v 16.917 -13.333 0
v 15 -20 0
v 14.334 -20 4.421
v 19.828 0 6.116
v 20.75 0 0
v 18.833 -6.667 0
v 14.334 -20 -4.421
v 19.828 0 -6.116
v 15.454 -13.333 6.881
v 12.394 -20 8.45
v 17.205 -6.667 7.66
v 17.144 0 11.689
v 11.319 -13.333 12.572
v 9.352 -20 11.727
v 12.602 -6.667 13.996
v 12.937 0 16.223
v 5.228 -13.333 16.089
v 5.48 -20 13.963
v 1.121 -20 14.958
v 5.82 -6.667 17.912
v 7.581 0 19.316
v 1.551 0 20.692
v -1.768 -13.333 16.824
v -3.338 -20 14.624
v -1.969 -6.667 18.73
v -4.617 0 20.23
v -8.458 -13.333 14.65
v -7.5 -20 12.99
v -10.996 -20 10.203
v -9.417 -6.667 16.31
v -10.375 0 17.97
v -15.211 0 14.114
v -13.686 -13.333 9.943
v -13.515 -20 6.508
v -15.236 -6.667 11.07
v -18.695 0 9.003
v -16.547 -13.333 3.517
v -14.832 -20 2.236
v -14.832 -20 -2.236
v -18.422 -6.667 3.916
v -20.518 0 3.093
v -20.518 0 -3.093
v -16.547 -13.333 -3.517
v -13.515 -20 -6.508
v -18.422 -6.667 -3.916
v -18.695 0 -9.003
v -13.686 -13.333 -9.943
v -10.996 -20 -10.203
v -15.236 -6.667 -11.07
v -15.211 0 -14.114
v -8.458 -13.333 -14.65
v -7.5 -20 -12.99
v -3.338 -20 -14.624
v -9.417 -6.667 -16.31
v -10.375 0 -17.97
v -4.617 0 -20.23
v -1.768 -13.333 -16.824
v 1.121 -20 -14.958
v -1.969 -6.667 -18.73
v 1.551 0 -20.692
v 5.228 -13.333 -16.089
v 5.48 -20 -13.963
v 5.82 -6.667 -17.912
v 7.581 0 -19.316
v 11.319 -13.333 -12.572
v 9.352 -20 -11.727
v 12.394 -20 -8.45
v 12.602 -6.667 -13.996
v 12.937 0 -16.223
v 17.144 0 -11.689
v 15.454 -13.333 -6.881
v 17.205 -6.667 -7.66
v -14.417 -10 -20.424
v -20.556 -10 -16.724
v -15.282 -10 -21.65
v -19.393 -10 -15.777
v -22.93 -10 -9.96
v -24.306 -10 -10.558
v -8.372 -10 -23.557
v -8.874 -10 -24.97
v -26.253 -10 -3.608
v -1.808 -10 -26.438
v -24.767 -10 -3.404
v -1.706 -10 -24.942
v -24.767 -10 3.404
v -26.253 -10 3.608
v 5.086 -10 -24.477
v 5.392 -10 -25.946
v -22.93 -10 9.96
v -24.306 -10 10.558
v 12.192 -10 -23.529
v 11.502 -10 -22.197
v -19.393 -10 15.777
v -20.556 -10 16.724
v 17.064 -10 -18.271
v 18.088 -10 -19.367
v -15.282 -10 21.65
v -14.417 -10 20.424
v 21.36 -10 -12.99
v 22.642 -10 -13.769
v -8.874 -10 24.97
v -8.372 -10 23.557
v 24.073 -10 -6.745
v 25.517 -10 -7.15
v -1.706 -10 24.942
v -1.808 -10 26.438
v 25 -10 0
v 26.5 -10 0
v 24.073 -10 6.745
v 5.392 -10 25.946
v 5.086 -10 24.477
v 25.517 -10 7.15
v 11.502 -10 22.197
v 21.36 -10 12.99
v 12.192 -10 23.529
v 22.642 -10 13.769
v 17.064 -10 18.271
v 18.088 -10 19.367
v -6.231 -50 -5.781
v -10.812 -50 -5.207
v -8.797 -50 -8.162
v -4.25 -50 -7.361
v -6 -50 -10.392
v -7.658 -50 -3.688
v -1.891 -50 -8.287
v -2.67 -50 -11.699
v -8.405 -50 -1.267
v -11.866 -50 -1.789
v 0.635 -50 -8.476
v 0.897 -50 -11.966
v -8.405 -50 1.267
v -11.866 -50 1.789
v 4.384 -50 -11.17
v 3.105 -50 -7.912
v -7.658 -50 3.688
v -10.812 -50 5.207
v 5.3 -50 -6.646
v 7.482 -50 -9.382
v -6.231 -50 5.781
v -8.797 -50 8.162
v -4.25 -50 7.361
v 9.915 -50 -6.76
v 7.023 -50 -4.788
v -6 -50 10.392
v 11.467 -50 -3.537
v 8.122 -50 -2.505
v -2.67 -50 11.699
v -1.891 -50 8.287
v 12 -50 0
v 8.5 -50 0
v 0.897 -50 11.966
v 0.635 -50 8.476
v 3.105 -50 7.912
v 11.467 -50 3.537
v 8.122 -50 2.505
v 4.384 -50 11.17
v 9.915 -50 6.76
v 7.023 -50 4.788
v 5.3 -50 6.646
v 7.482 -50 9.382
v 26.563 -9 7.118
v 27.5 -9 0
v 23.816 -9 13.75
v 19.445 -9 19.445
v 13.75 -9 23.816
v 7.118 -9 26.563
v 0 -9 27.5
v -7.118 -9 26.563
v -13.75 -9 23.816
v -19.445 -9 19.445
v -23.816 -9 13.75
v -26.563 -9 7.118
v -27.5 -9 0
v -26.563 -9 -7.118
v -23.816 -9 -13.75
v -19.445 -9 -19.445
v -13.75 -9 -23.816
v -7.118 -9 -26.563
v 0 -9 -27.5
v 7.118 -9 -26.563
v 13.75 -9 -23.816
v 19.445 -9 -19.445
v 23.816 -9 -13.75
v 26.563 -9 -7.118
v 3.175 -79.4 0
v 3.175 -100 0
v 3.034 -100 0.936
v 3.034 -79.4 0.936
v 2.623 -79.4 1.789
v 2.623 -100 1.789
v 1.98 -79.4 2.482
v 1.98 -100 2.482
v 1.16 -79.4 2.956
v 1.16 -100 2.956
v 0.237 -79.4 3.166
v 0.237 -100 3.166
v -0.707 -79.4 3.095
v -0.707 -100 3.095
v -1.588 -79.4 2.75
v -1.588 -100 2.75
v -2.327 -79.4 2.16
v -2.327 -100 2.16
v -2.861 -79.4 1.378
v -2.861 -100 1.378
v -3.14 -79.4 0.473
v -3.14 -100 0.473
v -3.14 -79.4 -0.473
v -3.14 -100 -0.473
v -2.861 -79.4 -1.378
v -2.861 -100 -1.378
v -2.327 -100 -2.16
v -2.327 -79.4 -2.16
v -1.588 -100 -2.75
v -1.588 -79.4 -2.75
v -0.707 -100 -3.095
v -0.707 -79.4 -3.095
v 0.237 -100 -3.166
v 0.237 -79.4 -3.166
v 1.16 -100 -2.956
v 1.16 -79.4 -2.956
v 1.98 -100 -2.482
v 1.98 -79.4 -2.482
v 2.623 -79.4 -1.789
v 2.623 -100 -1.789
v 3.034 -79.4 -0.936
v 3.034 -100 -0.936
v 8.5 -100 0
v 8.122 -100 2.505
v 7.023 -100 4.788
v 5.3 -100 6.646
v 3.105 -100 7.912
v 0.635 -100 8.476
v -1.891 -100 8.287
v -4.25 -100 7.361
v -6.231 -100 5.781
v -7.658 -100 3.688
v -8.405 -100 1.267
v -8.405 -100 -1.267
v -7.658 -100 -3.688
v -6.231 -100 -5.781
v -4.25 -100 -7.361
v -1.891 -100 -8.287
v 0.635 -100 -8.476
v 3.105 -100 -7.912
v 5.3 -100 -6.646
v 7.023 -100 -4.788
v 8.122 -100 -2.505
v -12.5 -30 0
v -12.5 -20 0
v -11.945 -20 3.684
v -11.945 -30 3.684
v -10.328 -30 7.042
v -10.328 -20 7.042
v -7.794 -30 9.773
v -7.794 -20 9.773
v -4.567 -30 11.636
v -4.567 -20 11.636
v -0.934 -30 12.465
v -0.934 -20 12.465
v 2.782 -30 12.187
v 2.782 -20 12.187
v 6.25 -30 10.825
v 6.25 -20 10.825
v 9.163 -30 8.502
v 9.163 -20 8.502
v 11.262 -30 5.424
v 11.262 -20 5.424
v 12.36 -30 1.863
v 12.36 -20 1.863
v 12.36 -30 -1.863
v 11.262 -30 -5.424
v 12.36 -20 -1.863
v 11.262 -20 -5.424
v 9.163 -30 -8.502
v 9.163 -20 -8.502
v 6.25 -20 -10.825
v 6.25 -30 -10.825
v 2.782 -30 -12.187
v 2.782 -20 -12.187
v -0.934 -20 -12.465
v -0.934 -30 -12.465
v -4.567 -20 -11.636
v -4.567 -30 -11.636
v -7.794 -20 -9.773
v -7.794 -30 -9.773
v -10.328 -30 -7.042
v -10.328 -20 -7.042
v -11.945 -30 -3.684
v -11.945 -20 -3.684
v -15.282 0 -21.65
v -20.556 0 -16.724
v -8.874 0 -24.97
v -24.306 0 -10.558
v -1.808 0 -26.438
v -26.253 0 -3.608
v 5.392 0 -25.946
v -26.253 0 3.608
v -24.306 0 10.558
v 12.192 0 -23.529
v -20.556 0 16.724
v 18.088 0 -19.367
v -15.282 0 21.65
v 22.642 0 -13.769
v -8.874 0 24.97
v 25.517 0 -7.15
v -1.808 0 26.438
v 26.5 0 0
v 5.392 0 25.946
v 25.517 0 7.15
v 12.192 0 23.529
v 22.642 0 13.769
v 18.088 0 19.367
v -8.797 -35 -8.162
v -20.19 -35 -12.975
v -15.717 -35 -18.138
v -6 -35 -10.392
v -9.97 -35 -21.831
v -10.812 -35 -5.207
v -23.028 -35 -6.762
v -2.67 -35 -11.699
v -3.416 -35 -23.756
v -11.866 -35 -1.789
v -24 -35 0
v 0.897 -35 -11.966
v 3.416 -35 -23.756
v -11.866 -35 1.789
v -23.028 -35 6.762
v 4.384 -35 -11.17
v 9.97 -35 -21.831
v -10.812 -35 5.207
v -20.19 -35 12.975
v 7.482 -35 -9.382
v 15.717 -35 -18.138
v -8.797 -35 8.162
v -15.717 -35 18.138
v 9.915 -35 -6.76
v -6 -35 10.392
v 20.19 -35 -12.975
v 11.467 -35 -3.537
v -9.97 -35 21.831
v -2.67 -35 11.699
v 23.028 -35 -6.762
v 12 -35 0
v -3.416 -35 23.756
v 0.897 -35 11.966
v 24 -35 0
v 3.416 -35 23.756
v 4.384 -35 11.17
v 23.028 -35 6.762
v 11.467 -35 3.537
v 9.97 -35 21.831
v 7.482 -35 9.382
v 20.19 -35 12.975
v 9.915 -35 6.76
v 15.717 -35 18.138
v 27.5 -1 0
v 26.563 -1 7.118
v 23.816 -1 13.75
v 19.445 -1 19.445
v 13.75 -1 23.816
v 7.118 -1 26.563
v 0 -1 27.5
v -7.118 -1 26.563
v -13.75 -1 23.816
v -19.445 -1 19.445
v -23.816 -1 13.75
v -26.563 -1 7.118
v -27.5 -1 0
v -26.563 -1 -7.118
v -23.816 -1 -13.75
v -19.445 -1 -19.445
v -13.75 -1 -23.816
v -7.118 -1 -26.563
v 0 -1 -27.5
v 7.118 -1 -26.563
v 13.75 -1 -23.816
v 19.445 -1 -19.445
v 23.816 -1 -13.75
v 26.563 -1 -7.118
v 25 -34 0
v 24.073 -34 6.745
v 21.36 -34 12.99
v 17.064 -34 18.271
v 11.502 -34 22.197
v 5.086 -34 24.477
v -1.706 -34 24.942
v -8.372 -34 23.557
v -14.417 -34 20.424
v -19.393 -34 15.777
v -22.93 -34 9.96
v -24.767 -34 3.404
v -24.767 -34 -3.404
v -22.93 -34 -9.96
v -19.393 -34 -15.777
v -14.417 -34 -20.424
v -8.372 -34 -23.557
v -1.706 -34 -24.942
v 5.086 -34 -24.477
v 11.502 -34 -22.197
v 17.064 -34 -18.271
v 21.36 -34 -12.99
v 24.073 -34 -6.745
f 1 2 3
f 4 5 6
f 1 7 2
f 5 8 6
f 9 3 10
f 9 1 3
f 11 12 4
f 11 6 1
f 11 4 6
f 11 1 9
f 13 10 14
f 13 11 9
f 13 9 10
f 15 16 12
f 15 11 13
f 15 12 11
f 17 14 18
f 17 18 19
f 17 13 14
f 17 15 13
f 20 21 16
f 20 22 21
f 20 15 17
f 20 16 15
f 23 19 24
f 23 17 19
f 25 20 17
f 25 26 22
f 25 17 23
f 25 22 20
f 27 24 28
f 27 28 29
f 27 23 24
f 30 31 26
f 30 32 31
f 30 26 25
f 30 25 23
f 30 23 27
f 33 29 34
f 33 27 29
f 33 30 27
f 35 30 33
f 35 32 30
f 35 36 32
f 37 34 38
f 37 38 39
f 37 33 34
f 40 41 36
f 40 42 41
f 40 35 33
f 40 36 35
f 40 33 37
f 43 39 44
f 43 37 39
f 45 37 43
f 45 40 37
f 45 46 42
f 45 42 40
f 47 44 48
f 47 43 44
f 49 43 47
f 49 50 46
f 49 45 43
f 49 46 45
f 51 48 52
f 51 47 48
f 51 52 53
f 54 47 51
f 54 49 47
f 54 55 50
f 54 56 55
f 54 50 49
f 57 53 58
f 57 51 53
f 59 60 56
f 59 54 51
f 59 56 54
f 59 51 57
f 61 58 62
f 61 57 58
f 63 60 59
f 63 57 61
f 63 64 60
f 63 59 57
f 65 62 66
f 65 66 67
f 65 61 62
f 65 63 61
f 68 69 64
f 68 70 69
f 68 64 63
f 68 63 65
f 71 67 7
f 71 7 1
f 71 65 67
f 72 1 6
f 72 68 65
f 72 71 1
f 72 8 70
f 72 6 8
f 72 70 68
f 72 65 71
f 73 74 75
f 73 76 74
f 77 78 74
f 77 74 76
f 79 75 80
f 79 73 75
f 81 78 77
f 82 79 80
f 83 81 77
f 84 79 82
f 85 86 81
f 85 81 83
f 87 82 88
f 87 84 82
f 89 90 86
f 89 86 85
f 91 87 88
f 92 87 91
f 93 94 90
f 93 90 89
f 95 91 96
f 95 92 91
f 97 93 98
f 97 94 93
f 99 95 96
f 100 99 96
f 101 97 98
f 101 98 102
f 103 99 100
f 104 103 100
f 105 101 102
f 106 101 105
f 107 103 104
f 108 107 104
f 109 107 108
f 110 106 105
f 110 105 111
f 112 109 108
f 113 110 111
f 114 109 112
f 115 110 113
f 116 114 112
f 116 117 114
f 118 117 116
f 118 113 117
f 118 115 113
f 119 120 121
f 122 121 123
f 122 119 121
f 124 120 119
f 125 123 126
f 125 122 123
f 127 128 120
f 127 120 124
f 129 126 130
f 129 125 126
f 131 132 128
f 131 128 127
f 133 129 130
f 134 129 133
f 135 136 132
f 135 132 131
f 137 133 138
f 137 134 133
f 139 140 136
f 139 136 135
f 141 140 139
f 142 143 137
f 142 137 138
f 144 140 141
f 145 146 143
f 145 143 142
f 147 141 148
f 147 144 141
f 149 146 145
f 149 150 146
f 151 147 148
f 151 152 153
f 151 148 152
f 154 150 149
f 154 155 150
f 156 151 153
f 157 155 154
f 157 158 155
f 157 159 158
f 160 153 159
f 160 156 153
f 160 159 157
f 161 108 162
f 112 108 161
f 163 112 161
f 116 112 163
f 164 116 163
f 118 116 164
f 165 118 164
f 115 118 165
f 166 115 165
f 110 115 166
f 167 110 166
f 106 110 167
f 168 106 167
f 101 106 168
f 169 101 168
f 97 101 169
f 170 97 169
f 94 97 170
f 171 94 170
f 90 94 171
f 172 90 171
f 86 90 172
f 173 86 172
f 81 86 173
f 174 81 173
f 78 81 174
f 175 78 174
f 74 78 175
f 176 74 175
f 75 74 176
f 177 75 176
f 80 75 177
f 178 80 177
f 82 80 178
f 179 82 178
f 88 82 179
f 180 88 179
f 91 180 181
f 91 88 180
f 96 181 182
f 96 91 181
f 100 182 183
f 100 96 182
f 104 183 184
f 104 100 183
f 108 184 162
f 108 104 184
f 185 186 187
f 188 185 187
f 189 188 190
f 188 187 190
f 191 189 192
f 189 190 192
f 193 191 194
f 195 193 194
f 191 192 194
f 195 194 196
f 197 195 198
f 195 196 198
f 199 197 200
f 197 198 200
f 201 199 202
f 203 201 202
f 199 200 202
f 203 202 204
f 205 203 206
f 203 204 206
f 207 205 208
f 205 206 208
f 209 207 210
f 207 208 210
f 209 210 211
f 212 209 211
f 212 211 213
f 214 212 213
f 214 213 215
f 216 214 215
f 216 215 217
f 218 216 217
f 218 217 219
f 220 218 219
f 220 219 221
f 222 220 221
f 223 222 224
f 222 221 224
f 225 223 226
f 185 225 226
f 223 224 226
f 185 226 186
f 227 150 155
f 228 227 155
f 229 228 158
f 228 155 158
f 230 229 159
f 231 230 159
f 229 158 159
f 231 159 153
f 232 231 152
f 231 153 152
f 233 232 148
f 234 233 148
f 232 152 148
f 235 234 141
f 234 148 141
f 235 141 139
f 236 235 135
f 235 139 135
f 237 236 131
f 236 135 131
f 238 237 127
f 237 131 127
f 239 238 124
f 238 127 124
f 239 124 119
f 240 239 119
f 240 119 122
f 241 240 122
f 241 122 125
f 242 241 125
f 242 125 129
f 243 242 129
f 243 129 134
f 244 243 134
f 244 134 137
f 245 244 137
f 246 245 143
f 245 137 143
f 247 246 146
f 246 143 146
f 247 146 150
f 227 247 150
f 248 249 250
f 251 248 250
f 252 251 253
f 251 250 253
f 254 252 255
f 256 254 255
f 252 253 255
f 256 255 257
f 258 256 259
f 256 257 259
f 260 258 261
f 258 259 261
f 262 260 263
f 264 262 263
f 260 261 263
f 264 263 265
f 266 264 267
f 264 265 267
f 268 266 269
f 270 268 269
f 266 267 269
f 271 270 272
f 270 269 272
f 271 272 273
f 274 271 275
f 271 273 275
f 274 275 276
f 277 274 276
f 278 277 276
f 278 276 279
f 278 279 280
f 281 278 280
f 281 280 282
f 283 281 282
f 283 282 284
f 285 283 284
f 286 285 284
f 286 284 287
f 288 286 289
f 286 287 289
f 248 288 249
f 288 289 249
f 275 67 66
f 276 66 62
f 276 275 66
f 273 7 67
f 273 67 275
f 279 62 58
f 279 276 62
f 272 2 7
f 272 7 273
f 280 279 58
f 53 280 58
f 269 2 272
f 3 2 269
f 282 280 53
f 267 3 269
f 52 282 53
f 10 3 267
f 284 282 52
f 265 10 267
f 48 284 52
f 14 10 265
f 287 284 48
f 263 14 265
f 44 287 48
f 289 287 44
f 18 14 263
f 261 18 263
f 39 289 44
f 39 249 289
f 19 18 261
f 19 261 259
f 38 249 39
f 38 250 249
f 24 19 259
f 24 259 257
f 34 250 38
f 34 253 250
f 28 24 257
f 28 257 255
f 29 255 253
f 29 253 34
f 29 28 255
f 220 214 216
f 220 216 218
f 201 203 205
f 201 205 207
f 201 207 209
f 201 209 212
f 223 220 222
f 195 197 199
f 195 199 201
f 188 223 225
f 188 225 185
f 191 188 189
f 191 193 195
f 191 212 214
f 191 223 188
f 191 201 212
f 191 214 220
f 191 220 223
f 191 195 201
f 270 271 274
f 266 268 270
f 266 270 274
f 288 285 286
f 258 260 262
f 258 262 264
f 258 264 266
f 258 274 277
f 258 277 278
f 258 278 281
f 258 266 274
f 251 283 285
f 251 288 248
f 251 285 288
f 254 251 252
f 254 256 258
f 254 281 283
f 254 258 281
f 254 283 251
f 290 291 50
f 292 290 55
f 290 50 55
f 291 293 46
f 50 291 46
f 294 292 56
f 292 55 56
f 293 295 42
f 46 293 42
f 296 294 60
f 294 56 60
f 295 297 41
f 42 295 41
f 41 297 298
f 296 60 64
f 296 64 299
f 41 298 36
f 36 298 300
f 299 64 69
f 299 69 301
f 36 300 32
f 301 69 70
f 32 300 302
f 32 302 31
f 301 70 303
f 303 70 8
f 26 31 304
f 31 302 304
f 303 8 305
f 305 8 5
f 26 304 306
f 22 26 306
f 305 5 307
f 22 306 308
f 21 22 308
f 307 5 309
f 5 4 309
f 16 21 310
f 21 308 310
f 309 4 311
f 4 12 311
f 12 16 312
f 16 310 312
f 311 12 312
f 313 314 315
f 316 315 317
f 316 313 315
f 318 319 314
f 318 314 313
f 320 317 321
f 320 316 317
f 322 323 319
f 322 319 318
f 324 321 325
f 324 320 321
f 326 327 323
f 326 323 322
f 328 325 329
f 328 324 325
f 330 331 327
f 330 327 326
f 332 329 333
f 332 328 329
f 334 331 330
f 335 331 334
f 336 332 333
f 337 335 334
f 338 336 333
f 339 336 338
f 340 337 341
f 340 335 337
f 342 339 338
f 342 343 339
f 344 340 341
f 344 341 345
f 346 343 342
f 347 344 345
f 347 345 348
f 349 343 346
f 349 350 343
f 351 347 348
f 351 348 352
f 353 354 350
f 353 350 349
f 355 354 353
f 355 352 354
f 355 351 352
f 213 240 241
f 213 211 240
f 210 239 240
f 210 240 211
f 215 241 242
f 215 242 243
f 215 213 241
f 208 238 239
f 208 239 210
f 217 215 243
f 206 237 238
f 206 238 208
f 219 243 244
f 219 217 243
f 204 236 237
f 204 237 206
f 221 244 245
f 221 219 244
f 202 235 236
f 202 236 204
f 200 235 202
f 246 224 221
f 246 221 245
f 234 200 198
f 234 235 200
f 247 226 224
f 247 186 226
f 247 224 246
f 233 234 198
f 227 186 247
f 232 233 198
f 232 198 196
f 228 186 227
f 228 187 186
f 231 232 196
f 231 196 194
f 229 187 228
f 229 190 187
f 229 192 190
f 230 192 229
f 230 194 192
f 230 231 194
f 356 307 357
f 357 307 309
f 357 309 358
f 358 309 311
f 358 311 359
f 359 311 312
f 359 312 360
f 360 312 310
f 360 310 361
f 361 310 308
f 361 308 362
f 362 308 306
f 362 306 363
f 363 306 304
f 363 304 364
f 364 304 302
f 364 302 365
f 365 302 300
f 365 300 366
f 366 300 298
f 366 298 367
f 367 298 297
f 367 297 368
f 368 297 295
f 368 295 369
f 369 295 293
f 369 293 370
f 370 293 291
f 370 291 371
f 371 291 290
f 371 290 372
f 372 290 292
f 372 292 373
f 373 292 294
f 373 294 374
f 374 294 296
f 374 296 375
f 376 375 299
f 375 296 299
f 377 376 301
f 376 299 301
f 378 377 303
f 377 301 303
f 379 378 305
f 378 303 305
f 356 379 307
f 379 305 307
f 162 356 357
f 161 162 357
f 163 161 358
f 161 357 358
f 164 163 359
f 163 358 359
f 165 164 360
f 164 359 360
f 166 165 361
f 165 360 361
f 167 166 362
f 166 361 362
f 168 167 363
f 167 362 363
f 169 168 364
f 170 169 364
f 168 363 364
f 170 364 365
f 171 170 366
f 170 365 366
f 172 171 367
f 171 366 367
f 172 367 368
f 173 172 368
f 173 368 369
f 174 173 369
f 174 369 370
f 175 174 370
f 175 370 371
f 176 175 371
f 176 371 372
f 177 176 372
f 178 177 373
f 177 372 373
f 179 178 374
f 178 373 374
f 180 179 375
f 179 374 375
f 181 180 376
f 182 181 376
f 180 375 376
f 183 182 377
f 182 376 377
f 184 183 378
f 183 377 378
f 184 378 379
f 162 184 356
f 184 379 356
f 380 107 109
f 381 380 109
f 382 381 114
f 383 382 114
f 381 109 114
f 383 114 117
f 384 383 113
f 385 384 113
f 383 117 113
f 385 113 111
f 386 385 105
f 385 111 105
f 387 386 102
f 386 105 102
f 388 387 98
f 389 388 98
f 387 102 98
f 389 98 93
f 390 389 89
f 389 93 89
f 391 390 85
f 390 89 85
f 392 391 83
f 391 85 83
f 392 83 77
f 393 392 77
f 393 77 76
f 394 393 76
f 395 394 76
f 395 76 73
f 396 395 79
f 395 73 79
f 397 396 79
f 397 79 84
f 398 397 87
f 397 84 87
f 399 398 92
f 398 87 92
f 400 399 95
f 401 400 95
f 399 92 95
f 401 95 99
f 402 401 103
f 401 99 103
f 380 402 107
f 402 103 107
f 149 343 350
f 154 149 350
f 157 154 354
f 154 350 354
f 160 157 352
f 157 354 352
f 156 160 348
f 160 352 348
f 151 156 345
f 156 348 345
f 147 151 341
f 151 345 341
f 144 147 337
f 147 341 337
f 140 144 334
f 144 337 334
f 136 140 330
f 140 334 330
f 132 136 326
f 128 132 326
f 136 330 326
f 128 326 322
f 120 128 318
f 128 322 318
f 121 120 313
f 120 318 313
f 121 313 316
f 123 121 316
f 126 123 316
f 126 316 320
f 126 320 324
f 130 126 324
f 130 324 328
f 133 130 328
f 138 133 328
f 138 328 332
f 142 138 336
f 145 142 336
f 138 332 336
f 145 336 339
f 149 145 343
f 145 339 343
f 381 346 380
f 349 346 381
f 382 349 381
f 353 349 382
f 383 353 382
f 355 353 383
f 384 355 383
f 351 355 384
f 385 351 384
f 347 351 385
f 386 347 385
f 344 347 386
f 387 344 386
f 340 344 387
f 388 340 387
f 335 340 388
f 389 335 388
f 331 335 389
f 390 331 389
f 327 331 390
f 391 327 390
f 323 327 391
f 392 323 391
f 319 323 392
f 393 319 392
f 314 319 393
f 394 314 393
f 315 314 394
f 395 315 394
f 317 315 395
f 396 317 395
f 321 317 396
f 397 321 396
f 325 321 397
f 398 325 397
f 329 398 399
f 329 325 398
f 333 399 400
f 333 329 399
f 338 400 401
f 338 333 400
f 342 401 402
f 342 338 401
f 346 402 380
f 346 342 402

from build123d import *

# Parameters (mm, degrees)
F0_R      = 27.5
F1_DEPTH  = 10
F2_R      = 25
F3_DEPTH  = 25
F4_R      = 12
F5_DEPTH  = 15
F6_SIZE   = 1
F9_R      = 12.5
F10_DEPTH = 10
F11_R     = 8.5
F12_DEPTH = 50
F13_R     = 3.175
F14_DEPTH = 20.6


with BuildPart() as f1:
    # F0 (on Front) → F1 (new body)
    with BuildSketch(Plane.XZ):
        Circle(F0_R)
    extrude(amount=F1_DEPTH)

    # F2 (on face) → F3 (join)
    with BuildSketch(Plane.XZ.offset(10)):
        Circle(F2_R)
    extrude(amount=F3_DEPTH)

    # F4 (on face) → F5 (join)
    with BuildSketch(Plane.XZ.offset(35)):
        Circle(F4_R)
    extrude(amount=F5_DEPTH)

    # F6
    f6_edges = [f1.edges().sort_by_distance(p)[0] for p in [
        (-27.5, -10, 0),
        (-27.5, 0, 0),
        (-25, -35, 0),
    ]]
    chamfer(f6_edges, length=F6_SIZE)

    # F7 (on Top) → F8 (revolve, cut)
    with BuildSketch(Plane.XY):
        Polygon((20.75, 0), (0, 0), (0, -20), (15, -20), align=None)
    revolve(axis=Axis((0, -10, 0), (0, -1, 0)), mode=Mode.SUBTRACT)

    # F9 (on face) → F10 (cut)
    with BuildSketch(Plane(origin=(0, -20, 0), x_dir=(-1, 0, 0), z_dir=(0, 1, 0))):
        Circle(F9_R)
    extrude(amount=-F10_DEPTH, mode=Mode.SUBTRACT)

    # F11 (on face) → F12 (join)
    with BuildSketch(Plane.XZ.offset(50)):
        Circle(F11_R)
    extrude(amount=F12_DEPTH)

    # F13 (on face) → F14 (cut)
    with BuildSketch(Plane.XZ.offset(100)):
        Circle(F13_R)
    extrude(amount=-F14_DEPTH, mode=Mode.SUBTRACT)


solid = f1.part
